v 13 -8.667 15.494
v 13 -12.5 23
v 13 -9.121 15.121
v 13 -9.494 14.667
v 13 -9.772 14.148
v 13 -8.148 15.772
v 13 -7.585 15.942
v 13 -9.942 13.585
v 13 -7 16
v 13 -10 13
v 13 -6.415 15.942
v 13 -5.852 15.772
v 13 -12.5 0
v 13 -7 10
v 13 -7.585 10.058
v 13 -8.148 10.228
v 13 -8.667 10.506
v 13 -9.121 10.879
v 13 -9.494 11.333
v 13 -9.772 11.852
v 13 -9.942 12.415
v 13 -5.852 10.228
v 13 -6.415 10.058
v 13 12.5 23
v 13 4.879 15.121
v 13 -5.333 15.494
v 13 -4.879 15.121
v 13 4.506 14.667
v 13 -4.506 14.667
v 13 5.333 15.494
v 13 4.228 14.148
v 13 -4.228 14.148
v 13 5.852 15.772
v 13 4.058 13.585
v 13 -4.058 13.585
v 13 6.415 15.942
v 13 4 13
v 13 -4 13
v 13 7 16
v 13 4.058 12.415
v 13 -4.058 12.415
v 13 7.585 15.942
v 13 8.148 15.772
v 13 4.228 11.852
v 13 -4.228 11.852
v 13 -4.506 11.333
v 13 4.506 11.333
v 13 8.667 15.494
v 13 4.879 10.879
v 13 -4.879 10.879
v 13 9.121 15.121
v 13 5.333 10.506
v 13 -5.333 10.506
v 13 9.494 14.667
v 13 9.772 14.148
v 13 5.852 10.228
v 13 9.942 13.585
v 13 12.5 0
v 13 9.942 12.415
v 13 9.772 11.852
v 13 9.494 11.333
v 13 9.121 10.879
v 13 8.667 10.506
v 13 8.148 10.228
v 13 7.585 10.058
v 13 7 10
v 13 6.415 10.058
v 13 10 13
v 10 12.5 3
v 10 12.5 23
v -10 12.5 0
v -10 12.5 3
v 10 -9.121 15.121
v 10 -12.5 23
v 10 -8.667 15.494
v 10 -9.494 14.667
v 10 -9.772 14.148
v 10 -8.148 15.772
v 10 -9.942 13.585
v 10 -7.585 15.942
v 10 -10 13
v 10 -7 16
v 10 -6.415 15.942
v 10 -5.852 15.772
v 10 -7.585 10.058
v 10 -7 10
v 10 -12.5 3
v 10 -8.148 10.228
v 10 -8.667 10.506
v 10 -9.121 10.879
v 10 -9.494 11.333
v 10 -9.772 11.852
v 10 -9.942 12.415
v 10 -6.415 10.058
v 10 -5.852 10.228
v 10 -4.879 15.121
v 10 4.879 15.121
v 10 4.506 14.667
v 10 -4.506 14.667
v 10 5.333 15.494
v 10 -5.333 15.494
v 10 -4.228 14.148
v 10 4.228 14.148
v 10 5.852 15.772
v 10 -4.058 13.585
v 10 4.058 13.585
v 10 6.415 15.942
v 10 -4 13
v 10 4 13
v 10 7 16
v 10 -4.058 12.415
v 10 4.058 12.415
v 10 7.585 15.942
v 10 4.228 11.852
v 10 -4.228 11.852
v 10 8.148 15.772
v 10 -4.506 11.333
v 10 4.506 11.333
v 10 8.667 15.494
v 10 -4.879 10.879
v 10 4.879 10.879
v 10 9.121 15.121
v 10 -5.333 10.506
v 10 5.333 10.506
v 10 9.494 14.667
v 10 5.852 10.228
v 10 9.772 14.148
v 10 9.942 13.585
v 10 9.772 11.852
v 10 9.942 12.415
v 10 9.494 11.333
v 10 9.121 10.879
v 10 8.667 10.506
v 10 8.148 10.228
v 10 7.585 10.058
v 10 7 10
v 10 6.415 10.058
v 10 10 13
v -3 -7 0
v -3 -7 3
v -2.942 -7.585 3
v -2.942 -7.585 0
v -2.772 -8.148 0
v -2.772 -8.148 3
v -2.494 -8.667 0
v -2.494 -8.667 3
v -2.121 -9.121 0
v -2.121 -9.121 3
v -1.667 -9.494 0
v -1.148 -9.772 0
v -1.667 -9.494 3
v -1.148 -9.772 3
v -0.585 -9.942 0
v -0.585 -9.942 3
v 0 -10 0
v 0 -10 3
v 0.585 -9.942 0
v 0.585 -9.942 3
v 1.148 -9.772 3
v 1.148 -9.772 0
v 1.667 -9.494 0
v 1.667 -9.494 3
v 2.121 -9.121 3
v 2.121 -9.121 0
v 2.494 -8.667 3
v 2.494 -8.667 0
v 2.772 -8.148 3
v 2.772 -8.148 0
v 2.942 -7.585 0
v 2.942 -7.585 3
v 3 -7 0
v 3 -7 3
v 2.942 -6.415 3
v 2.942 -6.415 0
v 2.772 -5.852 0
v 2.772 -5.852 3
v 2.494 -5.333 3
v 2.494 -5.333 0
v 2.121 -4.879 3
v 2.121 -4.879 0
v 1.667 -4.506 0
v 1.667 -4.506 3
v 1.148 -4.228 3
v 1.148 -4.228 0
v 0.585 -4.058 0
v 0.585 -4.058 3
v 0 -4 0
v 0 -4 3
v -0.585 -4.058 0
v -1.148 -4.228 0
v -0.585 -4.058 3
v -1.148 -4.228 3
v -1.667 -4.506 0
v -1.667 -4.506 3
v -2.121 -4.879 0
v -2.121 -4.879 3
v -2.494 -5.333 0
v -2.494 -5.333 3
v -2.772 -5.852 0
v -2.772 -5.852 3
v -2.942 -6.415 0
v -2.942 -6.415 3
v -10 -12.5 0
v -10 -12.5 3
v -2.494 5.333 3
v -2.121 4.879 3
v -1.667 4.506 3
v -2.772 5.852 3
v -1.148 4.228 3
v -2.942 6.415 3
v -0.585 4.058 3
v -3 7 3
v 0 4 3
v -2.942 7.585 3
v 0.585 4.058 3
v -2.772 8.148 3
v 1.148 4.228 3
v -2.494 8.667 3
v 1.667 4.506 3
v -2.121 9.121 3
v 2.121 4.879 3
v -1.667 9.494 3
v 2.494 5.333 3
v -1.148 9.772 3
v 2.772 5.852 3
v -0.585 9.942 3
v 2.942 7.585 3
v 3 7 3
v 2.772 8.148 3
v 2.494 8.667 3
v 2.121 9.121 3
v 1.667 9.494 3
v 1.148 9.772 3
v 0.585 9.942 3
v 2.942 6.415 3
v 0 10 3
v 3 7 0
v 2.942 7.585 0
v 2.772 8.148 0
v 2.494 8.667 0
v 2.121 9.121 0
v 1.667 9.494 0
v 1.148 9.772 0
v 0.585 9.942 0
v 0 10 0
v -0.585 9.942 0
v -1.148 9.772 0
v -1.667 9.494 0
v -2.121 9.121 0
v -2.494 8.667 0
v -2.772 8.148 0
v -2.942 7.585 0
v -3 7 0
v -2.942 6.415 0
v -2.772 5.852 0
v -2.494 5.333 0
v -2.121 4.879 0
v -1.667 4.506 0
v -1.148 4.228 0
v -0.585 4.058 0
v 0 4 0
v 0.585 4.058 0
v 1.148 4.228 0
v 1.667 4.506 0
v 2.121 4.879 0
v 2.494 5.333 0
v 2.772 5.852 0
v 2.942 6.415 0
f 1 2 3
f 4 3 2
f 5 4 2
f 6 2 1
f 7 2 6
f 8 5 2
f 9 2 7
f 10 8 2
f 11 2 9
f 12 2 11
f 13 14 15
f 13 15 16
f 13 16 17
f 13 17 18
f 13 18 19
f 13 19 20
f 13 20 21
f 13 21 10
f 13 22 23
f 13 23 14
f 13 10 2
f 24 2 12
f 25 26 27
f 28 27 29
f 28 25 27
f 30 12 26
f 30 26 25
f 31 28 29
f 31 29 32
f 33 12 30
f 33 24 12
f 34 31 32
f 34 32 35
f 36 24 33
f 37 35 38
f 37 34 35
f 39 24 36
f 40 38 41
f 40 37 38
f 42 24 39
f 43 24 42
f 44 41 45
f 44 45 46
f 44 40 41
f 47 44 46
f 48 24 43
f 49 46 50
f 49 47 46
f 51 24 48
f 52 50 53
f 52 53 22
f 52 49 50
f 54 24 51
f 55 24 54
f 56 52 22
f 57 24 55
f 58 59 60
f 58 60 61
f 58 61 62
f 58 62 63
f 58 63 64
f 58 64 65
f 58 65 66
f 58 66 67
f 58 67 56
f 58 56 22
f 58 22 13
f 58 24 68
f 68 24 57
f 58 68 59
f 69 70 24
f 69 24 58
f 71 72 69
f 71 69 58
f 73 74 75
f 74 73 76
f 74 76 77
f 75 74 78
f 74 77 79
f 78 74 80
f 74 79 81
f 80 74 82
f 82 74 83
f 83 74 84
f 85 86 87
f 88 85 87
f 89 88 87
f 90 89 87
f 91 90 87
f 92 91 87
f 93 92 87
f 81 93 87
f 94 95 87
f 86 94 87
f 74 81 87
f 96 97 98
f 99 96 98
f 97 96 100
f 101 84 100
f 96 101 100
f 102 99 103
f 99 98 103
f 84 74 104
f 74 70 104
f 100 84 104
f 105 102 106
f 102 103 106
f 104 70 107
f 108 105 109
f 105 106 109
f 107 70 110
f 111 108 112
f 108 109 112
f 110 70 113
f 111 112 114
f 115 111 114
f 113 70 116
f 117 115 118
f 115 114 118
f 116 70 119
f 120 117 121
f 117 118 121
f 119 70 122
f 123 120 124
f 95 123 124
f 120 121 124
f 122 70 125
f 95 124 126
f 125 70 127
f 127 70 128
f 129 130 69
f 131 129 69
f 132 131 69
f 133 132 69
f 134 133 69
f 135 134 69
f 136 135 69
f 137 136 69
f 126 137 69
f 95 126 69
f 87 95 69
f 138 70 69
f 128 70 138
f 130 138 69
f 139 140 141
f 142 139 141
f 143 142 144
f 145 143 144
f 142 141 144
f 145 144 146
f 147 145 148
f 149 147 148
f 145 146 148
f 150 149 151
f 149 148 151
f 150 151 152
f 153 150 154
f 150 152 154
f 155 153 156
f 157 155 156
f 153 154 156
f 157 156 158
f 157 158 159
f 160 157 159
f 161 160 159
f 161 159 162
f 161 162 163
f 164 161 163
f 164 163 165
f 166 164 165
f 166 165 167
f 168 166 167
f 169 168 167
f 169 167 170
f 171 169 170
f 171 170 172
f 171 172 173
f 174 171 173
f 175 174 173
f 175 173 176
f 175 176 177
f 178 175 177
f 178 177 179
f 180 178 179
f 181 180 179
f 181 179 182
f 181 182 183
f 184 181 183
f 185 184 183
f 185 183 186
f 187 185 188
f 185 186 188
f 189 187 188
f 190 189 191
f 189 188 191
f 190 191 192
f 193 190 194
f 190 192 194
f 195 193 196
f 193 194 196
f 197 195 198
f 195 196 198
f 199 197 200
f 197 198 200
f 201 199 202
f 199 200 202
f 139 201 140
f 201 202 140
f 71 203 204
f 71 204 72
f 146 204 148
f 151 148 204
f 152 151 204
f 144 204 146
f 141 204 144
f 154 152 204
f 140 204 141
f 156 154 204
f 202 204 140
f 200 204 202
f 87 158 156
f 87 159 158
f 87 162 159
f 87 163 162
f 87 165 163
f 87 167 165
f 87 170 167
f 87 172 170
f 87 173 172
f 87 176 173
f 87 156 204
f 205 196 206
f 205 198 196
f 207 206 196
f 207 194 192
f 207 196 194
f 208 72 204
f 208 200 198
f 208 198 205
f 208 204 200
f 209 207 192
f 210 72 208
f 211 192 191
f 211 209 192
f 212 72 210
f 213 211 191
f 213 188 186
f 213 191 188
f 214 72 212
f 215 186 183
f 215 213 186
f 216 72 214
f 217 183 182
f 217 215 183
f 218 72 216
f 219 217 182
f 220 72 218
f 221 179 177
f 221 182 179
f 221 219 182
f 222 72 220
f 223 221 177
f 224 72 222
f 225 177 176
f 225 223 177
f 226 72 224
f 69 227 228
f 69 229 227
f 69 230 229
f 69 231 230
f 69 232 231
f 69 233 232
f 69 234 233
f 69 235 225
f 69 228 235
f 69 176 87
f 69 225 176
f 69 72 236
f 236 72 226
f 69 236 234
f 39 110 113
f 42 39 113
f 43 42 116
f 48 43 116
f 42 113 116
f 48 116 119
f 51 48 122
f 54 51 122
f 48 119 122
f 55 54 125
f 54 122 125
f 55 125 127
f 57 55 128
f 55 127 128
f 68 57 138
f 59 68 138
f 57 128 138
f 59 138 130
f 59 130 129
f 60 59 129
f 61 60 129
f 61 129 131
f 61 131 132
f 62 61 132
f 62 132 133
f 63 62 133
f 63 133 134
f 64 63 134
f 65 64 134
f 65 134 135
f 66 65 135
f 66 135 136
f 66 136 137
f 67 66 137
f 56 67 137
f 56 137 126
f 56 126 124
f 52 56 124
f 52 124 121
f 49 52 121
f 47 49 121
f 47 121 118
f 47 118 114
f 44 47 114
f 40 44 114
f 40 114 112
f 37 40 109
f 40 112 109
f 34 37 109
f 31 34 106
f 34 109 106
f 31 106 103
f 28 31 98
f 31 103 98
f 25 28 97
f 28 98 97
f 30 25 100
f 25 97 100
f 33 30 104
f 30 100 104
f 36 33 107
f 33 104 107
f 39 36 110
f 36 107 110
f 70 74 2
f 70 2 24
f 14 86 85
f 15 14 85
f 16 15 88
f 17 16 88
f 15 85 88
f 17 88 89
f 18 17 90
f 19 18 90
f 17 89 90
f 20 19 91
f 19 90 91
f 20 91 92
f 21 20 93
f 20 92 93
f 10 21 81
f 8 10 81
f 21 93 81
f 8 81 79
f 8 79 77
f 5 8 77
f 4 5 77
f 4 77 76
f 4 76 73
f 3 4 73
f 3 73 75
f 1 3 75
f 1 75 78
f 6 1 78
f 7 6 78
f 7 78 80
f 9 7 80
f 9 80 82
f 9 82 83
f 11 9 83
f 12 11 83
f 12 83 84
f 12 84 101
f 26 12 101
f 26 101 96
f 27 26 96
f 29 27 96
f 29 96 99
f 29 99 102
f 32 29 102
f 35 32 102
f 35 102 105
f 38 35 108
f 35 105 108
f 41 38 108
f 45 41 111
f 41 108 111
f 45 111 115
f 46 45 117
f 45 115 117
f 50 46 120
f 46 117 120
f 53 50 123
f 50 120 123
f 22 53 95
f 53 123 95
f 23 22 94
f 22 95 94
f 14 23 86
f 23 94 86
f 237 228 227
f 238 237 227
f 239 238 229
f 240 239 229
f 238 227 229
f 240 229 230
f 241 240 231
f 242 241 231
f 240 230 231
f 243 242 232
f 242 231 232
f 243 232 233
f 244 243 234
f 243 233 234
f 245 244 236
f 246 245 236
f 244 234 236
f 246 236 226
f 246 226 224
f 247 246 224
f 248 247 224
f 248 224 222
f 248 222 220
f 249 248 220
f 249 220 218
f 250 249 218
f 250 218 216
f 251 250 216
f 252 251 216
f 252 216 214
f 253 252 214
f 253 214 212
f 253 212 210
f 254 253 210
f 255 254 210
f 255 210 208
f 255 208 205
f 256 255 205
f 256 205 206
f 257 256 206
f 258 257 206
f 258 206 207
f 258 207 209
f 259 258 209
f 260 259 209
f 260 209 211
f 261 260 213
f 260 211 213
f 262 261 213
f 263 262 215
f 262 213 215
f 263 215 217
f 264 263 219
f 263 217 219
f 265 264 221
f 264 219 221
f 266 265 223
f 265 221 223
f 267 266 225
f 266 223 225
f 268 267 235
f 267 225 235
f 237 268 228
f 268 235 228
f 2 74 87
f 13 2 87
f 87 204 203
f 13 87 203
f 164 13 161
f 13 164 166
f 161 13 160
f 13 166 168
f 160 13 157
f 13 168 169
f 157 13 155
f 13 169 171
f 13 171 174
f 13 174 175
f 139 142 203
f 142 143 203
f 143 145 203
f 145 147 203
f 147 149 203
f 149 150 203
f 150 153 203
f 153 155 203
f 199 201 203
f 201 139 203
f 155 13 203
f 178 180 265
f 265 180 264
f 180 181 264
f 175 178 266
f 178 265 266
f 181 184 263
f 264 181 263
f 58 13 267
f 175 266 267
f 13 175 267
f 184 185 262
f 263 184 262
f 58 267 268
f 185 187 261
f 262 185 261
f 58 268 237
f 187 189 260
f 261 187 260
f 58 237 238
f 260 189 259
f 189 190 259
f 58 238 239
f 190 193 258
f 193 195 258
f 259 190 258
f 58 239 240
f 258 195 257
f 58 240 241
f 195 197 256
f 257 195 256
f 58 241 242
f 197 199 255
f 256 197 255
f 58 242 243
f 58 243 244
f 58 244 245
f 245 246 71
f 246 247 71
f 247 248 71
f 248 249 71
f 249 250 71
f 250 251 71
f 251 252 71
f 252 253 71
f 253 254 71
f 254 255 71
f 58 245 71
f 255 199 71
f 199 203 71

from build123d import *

# Parameters (mm, degrees)
SKETCH1_W           = 20
SKETCH1_H           = 25
BOSS_EXTRUDE1_DEPTH = 3
SKETCH3_W           = 23
SKETCH3_H           = 25
BOSS_EXTRUDE2_DEPTH = 3
SKETCH4_R           = 3
CUT_EXTRUDE1_DEPTH  = 27.930466019
SKETCH5_R           = 3
CUT_EXTRUDE2_DEPTH  = 33.94313282


with BuildPart() as part:
    # Sketch1 → Boss-Extrude1 (new body)
    with BuildSketch(Plane.XY):
        Rectangle(SKETCH1_W, SKETCH1_H)
    extrude(amount=BOSS_EXTRUDE1_DEPTH)

    # Sketch3 → Boss-Extrude2 (add)
    with BuildSketch(Plane(origin=(10, 0, 0), x_dir=(0, 0, -1), z_dir=(1, 0, 0))):
        with Locations((-11.5, 0)):
            Rectangle(SKETCH3_W, SKETCH3_H)
    extrude(amount=BOSS_EXTRUDE2_DEPTH)

    # Sketch4 → Cut-Extrude1 (cut, through all)
    with BuildSketch(Plane.XY.offset(3)):
        with Locations((0, 7)):
            Circle(SKETCH4_R)
        with Locations(Location((0, -7, 0), (0, 0, 180))):
            Circle(SKETCH4_R)
    extrude(amount=-CUT_EXTRUDE1_DEPTH, mode=Mode.SUBTRACT)

    # Sketch5 → Cut-Extrude2 (cut, through all)
    with BuildSketch(Plane.ZY.offset(-10)):
        with Locations((13, 7)):
            Circle(SKETCH5_R)
        with Locations(Location((13, -7, 0), (0, 0, 180))):
            Circle(SKETCH5_R)
    extrude(amount=-CUT_EXTRUDE2_DEPTH, mode=Mode.SUBTRACT)


solid = part.part
